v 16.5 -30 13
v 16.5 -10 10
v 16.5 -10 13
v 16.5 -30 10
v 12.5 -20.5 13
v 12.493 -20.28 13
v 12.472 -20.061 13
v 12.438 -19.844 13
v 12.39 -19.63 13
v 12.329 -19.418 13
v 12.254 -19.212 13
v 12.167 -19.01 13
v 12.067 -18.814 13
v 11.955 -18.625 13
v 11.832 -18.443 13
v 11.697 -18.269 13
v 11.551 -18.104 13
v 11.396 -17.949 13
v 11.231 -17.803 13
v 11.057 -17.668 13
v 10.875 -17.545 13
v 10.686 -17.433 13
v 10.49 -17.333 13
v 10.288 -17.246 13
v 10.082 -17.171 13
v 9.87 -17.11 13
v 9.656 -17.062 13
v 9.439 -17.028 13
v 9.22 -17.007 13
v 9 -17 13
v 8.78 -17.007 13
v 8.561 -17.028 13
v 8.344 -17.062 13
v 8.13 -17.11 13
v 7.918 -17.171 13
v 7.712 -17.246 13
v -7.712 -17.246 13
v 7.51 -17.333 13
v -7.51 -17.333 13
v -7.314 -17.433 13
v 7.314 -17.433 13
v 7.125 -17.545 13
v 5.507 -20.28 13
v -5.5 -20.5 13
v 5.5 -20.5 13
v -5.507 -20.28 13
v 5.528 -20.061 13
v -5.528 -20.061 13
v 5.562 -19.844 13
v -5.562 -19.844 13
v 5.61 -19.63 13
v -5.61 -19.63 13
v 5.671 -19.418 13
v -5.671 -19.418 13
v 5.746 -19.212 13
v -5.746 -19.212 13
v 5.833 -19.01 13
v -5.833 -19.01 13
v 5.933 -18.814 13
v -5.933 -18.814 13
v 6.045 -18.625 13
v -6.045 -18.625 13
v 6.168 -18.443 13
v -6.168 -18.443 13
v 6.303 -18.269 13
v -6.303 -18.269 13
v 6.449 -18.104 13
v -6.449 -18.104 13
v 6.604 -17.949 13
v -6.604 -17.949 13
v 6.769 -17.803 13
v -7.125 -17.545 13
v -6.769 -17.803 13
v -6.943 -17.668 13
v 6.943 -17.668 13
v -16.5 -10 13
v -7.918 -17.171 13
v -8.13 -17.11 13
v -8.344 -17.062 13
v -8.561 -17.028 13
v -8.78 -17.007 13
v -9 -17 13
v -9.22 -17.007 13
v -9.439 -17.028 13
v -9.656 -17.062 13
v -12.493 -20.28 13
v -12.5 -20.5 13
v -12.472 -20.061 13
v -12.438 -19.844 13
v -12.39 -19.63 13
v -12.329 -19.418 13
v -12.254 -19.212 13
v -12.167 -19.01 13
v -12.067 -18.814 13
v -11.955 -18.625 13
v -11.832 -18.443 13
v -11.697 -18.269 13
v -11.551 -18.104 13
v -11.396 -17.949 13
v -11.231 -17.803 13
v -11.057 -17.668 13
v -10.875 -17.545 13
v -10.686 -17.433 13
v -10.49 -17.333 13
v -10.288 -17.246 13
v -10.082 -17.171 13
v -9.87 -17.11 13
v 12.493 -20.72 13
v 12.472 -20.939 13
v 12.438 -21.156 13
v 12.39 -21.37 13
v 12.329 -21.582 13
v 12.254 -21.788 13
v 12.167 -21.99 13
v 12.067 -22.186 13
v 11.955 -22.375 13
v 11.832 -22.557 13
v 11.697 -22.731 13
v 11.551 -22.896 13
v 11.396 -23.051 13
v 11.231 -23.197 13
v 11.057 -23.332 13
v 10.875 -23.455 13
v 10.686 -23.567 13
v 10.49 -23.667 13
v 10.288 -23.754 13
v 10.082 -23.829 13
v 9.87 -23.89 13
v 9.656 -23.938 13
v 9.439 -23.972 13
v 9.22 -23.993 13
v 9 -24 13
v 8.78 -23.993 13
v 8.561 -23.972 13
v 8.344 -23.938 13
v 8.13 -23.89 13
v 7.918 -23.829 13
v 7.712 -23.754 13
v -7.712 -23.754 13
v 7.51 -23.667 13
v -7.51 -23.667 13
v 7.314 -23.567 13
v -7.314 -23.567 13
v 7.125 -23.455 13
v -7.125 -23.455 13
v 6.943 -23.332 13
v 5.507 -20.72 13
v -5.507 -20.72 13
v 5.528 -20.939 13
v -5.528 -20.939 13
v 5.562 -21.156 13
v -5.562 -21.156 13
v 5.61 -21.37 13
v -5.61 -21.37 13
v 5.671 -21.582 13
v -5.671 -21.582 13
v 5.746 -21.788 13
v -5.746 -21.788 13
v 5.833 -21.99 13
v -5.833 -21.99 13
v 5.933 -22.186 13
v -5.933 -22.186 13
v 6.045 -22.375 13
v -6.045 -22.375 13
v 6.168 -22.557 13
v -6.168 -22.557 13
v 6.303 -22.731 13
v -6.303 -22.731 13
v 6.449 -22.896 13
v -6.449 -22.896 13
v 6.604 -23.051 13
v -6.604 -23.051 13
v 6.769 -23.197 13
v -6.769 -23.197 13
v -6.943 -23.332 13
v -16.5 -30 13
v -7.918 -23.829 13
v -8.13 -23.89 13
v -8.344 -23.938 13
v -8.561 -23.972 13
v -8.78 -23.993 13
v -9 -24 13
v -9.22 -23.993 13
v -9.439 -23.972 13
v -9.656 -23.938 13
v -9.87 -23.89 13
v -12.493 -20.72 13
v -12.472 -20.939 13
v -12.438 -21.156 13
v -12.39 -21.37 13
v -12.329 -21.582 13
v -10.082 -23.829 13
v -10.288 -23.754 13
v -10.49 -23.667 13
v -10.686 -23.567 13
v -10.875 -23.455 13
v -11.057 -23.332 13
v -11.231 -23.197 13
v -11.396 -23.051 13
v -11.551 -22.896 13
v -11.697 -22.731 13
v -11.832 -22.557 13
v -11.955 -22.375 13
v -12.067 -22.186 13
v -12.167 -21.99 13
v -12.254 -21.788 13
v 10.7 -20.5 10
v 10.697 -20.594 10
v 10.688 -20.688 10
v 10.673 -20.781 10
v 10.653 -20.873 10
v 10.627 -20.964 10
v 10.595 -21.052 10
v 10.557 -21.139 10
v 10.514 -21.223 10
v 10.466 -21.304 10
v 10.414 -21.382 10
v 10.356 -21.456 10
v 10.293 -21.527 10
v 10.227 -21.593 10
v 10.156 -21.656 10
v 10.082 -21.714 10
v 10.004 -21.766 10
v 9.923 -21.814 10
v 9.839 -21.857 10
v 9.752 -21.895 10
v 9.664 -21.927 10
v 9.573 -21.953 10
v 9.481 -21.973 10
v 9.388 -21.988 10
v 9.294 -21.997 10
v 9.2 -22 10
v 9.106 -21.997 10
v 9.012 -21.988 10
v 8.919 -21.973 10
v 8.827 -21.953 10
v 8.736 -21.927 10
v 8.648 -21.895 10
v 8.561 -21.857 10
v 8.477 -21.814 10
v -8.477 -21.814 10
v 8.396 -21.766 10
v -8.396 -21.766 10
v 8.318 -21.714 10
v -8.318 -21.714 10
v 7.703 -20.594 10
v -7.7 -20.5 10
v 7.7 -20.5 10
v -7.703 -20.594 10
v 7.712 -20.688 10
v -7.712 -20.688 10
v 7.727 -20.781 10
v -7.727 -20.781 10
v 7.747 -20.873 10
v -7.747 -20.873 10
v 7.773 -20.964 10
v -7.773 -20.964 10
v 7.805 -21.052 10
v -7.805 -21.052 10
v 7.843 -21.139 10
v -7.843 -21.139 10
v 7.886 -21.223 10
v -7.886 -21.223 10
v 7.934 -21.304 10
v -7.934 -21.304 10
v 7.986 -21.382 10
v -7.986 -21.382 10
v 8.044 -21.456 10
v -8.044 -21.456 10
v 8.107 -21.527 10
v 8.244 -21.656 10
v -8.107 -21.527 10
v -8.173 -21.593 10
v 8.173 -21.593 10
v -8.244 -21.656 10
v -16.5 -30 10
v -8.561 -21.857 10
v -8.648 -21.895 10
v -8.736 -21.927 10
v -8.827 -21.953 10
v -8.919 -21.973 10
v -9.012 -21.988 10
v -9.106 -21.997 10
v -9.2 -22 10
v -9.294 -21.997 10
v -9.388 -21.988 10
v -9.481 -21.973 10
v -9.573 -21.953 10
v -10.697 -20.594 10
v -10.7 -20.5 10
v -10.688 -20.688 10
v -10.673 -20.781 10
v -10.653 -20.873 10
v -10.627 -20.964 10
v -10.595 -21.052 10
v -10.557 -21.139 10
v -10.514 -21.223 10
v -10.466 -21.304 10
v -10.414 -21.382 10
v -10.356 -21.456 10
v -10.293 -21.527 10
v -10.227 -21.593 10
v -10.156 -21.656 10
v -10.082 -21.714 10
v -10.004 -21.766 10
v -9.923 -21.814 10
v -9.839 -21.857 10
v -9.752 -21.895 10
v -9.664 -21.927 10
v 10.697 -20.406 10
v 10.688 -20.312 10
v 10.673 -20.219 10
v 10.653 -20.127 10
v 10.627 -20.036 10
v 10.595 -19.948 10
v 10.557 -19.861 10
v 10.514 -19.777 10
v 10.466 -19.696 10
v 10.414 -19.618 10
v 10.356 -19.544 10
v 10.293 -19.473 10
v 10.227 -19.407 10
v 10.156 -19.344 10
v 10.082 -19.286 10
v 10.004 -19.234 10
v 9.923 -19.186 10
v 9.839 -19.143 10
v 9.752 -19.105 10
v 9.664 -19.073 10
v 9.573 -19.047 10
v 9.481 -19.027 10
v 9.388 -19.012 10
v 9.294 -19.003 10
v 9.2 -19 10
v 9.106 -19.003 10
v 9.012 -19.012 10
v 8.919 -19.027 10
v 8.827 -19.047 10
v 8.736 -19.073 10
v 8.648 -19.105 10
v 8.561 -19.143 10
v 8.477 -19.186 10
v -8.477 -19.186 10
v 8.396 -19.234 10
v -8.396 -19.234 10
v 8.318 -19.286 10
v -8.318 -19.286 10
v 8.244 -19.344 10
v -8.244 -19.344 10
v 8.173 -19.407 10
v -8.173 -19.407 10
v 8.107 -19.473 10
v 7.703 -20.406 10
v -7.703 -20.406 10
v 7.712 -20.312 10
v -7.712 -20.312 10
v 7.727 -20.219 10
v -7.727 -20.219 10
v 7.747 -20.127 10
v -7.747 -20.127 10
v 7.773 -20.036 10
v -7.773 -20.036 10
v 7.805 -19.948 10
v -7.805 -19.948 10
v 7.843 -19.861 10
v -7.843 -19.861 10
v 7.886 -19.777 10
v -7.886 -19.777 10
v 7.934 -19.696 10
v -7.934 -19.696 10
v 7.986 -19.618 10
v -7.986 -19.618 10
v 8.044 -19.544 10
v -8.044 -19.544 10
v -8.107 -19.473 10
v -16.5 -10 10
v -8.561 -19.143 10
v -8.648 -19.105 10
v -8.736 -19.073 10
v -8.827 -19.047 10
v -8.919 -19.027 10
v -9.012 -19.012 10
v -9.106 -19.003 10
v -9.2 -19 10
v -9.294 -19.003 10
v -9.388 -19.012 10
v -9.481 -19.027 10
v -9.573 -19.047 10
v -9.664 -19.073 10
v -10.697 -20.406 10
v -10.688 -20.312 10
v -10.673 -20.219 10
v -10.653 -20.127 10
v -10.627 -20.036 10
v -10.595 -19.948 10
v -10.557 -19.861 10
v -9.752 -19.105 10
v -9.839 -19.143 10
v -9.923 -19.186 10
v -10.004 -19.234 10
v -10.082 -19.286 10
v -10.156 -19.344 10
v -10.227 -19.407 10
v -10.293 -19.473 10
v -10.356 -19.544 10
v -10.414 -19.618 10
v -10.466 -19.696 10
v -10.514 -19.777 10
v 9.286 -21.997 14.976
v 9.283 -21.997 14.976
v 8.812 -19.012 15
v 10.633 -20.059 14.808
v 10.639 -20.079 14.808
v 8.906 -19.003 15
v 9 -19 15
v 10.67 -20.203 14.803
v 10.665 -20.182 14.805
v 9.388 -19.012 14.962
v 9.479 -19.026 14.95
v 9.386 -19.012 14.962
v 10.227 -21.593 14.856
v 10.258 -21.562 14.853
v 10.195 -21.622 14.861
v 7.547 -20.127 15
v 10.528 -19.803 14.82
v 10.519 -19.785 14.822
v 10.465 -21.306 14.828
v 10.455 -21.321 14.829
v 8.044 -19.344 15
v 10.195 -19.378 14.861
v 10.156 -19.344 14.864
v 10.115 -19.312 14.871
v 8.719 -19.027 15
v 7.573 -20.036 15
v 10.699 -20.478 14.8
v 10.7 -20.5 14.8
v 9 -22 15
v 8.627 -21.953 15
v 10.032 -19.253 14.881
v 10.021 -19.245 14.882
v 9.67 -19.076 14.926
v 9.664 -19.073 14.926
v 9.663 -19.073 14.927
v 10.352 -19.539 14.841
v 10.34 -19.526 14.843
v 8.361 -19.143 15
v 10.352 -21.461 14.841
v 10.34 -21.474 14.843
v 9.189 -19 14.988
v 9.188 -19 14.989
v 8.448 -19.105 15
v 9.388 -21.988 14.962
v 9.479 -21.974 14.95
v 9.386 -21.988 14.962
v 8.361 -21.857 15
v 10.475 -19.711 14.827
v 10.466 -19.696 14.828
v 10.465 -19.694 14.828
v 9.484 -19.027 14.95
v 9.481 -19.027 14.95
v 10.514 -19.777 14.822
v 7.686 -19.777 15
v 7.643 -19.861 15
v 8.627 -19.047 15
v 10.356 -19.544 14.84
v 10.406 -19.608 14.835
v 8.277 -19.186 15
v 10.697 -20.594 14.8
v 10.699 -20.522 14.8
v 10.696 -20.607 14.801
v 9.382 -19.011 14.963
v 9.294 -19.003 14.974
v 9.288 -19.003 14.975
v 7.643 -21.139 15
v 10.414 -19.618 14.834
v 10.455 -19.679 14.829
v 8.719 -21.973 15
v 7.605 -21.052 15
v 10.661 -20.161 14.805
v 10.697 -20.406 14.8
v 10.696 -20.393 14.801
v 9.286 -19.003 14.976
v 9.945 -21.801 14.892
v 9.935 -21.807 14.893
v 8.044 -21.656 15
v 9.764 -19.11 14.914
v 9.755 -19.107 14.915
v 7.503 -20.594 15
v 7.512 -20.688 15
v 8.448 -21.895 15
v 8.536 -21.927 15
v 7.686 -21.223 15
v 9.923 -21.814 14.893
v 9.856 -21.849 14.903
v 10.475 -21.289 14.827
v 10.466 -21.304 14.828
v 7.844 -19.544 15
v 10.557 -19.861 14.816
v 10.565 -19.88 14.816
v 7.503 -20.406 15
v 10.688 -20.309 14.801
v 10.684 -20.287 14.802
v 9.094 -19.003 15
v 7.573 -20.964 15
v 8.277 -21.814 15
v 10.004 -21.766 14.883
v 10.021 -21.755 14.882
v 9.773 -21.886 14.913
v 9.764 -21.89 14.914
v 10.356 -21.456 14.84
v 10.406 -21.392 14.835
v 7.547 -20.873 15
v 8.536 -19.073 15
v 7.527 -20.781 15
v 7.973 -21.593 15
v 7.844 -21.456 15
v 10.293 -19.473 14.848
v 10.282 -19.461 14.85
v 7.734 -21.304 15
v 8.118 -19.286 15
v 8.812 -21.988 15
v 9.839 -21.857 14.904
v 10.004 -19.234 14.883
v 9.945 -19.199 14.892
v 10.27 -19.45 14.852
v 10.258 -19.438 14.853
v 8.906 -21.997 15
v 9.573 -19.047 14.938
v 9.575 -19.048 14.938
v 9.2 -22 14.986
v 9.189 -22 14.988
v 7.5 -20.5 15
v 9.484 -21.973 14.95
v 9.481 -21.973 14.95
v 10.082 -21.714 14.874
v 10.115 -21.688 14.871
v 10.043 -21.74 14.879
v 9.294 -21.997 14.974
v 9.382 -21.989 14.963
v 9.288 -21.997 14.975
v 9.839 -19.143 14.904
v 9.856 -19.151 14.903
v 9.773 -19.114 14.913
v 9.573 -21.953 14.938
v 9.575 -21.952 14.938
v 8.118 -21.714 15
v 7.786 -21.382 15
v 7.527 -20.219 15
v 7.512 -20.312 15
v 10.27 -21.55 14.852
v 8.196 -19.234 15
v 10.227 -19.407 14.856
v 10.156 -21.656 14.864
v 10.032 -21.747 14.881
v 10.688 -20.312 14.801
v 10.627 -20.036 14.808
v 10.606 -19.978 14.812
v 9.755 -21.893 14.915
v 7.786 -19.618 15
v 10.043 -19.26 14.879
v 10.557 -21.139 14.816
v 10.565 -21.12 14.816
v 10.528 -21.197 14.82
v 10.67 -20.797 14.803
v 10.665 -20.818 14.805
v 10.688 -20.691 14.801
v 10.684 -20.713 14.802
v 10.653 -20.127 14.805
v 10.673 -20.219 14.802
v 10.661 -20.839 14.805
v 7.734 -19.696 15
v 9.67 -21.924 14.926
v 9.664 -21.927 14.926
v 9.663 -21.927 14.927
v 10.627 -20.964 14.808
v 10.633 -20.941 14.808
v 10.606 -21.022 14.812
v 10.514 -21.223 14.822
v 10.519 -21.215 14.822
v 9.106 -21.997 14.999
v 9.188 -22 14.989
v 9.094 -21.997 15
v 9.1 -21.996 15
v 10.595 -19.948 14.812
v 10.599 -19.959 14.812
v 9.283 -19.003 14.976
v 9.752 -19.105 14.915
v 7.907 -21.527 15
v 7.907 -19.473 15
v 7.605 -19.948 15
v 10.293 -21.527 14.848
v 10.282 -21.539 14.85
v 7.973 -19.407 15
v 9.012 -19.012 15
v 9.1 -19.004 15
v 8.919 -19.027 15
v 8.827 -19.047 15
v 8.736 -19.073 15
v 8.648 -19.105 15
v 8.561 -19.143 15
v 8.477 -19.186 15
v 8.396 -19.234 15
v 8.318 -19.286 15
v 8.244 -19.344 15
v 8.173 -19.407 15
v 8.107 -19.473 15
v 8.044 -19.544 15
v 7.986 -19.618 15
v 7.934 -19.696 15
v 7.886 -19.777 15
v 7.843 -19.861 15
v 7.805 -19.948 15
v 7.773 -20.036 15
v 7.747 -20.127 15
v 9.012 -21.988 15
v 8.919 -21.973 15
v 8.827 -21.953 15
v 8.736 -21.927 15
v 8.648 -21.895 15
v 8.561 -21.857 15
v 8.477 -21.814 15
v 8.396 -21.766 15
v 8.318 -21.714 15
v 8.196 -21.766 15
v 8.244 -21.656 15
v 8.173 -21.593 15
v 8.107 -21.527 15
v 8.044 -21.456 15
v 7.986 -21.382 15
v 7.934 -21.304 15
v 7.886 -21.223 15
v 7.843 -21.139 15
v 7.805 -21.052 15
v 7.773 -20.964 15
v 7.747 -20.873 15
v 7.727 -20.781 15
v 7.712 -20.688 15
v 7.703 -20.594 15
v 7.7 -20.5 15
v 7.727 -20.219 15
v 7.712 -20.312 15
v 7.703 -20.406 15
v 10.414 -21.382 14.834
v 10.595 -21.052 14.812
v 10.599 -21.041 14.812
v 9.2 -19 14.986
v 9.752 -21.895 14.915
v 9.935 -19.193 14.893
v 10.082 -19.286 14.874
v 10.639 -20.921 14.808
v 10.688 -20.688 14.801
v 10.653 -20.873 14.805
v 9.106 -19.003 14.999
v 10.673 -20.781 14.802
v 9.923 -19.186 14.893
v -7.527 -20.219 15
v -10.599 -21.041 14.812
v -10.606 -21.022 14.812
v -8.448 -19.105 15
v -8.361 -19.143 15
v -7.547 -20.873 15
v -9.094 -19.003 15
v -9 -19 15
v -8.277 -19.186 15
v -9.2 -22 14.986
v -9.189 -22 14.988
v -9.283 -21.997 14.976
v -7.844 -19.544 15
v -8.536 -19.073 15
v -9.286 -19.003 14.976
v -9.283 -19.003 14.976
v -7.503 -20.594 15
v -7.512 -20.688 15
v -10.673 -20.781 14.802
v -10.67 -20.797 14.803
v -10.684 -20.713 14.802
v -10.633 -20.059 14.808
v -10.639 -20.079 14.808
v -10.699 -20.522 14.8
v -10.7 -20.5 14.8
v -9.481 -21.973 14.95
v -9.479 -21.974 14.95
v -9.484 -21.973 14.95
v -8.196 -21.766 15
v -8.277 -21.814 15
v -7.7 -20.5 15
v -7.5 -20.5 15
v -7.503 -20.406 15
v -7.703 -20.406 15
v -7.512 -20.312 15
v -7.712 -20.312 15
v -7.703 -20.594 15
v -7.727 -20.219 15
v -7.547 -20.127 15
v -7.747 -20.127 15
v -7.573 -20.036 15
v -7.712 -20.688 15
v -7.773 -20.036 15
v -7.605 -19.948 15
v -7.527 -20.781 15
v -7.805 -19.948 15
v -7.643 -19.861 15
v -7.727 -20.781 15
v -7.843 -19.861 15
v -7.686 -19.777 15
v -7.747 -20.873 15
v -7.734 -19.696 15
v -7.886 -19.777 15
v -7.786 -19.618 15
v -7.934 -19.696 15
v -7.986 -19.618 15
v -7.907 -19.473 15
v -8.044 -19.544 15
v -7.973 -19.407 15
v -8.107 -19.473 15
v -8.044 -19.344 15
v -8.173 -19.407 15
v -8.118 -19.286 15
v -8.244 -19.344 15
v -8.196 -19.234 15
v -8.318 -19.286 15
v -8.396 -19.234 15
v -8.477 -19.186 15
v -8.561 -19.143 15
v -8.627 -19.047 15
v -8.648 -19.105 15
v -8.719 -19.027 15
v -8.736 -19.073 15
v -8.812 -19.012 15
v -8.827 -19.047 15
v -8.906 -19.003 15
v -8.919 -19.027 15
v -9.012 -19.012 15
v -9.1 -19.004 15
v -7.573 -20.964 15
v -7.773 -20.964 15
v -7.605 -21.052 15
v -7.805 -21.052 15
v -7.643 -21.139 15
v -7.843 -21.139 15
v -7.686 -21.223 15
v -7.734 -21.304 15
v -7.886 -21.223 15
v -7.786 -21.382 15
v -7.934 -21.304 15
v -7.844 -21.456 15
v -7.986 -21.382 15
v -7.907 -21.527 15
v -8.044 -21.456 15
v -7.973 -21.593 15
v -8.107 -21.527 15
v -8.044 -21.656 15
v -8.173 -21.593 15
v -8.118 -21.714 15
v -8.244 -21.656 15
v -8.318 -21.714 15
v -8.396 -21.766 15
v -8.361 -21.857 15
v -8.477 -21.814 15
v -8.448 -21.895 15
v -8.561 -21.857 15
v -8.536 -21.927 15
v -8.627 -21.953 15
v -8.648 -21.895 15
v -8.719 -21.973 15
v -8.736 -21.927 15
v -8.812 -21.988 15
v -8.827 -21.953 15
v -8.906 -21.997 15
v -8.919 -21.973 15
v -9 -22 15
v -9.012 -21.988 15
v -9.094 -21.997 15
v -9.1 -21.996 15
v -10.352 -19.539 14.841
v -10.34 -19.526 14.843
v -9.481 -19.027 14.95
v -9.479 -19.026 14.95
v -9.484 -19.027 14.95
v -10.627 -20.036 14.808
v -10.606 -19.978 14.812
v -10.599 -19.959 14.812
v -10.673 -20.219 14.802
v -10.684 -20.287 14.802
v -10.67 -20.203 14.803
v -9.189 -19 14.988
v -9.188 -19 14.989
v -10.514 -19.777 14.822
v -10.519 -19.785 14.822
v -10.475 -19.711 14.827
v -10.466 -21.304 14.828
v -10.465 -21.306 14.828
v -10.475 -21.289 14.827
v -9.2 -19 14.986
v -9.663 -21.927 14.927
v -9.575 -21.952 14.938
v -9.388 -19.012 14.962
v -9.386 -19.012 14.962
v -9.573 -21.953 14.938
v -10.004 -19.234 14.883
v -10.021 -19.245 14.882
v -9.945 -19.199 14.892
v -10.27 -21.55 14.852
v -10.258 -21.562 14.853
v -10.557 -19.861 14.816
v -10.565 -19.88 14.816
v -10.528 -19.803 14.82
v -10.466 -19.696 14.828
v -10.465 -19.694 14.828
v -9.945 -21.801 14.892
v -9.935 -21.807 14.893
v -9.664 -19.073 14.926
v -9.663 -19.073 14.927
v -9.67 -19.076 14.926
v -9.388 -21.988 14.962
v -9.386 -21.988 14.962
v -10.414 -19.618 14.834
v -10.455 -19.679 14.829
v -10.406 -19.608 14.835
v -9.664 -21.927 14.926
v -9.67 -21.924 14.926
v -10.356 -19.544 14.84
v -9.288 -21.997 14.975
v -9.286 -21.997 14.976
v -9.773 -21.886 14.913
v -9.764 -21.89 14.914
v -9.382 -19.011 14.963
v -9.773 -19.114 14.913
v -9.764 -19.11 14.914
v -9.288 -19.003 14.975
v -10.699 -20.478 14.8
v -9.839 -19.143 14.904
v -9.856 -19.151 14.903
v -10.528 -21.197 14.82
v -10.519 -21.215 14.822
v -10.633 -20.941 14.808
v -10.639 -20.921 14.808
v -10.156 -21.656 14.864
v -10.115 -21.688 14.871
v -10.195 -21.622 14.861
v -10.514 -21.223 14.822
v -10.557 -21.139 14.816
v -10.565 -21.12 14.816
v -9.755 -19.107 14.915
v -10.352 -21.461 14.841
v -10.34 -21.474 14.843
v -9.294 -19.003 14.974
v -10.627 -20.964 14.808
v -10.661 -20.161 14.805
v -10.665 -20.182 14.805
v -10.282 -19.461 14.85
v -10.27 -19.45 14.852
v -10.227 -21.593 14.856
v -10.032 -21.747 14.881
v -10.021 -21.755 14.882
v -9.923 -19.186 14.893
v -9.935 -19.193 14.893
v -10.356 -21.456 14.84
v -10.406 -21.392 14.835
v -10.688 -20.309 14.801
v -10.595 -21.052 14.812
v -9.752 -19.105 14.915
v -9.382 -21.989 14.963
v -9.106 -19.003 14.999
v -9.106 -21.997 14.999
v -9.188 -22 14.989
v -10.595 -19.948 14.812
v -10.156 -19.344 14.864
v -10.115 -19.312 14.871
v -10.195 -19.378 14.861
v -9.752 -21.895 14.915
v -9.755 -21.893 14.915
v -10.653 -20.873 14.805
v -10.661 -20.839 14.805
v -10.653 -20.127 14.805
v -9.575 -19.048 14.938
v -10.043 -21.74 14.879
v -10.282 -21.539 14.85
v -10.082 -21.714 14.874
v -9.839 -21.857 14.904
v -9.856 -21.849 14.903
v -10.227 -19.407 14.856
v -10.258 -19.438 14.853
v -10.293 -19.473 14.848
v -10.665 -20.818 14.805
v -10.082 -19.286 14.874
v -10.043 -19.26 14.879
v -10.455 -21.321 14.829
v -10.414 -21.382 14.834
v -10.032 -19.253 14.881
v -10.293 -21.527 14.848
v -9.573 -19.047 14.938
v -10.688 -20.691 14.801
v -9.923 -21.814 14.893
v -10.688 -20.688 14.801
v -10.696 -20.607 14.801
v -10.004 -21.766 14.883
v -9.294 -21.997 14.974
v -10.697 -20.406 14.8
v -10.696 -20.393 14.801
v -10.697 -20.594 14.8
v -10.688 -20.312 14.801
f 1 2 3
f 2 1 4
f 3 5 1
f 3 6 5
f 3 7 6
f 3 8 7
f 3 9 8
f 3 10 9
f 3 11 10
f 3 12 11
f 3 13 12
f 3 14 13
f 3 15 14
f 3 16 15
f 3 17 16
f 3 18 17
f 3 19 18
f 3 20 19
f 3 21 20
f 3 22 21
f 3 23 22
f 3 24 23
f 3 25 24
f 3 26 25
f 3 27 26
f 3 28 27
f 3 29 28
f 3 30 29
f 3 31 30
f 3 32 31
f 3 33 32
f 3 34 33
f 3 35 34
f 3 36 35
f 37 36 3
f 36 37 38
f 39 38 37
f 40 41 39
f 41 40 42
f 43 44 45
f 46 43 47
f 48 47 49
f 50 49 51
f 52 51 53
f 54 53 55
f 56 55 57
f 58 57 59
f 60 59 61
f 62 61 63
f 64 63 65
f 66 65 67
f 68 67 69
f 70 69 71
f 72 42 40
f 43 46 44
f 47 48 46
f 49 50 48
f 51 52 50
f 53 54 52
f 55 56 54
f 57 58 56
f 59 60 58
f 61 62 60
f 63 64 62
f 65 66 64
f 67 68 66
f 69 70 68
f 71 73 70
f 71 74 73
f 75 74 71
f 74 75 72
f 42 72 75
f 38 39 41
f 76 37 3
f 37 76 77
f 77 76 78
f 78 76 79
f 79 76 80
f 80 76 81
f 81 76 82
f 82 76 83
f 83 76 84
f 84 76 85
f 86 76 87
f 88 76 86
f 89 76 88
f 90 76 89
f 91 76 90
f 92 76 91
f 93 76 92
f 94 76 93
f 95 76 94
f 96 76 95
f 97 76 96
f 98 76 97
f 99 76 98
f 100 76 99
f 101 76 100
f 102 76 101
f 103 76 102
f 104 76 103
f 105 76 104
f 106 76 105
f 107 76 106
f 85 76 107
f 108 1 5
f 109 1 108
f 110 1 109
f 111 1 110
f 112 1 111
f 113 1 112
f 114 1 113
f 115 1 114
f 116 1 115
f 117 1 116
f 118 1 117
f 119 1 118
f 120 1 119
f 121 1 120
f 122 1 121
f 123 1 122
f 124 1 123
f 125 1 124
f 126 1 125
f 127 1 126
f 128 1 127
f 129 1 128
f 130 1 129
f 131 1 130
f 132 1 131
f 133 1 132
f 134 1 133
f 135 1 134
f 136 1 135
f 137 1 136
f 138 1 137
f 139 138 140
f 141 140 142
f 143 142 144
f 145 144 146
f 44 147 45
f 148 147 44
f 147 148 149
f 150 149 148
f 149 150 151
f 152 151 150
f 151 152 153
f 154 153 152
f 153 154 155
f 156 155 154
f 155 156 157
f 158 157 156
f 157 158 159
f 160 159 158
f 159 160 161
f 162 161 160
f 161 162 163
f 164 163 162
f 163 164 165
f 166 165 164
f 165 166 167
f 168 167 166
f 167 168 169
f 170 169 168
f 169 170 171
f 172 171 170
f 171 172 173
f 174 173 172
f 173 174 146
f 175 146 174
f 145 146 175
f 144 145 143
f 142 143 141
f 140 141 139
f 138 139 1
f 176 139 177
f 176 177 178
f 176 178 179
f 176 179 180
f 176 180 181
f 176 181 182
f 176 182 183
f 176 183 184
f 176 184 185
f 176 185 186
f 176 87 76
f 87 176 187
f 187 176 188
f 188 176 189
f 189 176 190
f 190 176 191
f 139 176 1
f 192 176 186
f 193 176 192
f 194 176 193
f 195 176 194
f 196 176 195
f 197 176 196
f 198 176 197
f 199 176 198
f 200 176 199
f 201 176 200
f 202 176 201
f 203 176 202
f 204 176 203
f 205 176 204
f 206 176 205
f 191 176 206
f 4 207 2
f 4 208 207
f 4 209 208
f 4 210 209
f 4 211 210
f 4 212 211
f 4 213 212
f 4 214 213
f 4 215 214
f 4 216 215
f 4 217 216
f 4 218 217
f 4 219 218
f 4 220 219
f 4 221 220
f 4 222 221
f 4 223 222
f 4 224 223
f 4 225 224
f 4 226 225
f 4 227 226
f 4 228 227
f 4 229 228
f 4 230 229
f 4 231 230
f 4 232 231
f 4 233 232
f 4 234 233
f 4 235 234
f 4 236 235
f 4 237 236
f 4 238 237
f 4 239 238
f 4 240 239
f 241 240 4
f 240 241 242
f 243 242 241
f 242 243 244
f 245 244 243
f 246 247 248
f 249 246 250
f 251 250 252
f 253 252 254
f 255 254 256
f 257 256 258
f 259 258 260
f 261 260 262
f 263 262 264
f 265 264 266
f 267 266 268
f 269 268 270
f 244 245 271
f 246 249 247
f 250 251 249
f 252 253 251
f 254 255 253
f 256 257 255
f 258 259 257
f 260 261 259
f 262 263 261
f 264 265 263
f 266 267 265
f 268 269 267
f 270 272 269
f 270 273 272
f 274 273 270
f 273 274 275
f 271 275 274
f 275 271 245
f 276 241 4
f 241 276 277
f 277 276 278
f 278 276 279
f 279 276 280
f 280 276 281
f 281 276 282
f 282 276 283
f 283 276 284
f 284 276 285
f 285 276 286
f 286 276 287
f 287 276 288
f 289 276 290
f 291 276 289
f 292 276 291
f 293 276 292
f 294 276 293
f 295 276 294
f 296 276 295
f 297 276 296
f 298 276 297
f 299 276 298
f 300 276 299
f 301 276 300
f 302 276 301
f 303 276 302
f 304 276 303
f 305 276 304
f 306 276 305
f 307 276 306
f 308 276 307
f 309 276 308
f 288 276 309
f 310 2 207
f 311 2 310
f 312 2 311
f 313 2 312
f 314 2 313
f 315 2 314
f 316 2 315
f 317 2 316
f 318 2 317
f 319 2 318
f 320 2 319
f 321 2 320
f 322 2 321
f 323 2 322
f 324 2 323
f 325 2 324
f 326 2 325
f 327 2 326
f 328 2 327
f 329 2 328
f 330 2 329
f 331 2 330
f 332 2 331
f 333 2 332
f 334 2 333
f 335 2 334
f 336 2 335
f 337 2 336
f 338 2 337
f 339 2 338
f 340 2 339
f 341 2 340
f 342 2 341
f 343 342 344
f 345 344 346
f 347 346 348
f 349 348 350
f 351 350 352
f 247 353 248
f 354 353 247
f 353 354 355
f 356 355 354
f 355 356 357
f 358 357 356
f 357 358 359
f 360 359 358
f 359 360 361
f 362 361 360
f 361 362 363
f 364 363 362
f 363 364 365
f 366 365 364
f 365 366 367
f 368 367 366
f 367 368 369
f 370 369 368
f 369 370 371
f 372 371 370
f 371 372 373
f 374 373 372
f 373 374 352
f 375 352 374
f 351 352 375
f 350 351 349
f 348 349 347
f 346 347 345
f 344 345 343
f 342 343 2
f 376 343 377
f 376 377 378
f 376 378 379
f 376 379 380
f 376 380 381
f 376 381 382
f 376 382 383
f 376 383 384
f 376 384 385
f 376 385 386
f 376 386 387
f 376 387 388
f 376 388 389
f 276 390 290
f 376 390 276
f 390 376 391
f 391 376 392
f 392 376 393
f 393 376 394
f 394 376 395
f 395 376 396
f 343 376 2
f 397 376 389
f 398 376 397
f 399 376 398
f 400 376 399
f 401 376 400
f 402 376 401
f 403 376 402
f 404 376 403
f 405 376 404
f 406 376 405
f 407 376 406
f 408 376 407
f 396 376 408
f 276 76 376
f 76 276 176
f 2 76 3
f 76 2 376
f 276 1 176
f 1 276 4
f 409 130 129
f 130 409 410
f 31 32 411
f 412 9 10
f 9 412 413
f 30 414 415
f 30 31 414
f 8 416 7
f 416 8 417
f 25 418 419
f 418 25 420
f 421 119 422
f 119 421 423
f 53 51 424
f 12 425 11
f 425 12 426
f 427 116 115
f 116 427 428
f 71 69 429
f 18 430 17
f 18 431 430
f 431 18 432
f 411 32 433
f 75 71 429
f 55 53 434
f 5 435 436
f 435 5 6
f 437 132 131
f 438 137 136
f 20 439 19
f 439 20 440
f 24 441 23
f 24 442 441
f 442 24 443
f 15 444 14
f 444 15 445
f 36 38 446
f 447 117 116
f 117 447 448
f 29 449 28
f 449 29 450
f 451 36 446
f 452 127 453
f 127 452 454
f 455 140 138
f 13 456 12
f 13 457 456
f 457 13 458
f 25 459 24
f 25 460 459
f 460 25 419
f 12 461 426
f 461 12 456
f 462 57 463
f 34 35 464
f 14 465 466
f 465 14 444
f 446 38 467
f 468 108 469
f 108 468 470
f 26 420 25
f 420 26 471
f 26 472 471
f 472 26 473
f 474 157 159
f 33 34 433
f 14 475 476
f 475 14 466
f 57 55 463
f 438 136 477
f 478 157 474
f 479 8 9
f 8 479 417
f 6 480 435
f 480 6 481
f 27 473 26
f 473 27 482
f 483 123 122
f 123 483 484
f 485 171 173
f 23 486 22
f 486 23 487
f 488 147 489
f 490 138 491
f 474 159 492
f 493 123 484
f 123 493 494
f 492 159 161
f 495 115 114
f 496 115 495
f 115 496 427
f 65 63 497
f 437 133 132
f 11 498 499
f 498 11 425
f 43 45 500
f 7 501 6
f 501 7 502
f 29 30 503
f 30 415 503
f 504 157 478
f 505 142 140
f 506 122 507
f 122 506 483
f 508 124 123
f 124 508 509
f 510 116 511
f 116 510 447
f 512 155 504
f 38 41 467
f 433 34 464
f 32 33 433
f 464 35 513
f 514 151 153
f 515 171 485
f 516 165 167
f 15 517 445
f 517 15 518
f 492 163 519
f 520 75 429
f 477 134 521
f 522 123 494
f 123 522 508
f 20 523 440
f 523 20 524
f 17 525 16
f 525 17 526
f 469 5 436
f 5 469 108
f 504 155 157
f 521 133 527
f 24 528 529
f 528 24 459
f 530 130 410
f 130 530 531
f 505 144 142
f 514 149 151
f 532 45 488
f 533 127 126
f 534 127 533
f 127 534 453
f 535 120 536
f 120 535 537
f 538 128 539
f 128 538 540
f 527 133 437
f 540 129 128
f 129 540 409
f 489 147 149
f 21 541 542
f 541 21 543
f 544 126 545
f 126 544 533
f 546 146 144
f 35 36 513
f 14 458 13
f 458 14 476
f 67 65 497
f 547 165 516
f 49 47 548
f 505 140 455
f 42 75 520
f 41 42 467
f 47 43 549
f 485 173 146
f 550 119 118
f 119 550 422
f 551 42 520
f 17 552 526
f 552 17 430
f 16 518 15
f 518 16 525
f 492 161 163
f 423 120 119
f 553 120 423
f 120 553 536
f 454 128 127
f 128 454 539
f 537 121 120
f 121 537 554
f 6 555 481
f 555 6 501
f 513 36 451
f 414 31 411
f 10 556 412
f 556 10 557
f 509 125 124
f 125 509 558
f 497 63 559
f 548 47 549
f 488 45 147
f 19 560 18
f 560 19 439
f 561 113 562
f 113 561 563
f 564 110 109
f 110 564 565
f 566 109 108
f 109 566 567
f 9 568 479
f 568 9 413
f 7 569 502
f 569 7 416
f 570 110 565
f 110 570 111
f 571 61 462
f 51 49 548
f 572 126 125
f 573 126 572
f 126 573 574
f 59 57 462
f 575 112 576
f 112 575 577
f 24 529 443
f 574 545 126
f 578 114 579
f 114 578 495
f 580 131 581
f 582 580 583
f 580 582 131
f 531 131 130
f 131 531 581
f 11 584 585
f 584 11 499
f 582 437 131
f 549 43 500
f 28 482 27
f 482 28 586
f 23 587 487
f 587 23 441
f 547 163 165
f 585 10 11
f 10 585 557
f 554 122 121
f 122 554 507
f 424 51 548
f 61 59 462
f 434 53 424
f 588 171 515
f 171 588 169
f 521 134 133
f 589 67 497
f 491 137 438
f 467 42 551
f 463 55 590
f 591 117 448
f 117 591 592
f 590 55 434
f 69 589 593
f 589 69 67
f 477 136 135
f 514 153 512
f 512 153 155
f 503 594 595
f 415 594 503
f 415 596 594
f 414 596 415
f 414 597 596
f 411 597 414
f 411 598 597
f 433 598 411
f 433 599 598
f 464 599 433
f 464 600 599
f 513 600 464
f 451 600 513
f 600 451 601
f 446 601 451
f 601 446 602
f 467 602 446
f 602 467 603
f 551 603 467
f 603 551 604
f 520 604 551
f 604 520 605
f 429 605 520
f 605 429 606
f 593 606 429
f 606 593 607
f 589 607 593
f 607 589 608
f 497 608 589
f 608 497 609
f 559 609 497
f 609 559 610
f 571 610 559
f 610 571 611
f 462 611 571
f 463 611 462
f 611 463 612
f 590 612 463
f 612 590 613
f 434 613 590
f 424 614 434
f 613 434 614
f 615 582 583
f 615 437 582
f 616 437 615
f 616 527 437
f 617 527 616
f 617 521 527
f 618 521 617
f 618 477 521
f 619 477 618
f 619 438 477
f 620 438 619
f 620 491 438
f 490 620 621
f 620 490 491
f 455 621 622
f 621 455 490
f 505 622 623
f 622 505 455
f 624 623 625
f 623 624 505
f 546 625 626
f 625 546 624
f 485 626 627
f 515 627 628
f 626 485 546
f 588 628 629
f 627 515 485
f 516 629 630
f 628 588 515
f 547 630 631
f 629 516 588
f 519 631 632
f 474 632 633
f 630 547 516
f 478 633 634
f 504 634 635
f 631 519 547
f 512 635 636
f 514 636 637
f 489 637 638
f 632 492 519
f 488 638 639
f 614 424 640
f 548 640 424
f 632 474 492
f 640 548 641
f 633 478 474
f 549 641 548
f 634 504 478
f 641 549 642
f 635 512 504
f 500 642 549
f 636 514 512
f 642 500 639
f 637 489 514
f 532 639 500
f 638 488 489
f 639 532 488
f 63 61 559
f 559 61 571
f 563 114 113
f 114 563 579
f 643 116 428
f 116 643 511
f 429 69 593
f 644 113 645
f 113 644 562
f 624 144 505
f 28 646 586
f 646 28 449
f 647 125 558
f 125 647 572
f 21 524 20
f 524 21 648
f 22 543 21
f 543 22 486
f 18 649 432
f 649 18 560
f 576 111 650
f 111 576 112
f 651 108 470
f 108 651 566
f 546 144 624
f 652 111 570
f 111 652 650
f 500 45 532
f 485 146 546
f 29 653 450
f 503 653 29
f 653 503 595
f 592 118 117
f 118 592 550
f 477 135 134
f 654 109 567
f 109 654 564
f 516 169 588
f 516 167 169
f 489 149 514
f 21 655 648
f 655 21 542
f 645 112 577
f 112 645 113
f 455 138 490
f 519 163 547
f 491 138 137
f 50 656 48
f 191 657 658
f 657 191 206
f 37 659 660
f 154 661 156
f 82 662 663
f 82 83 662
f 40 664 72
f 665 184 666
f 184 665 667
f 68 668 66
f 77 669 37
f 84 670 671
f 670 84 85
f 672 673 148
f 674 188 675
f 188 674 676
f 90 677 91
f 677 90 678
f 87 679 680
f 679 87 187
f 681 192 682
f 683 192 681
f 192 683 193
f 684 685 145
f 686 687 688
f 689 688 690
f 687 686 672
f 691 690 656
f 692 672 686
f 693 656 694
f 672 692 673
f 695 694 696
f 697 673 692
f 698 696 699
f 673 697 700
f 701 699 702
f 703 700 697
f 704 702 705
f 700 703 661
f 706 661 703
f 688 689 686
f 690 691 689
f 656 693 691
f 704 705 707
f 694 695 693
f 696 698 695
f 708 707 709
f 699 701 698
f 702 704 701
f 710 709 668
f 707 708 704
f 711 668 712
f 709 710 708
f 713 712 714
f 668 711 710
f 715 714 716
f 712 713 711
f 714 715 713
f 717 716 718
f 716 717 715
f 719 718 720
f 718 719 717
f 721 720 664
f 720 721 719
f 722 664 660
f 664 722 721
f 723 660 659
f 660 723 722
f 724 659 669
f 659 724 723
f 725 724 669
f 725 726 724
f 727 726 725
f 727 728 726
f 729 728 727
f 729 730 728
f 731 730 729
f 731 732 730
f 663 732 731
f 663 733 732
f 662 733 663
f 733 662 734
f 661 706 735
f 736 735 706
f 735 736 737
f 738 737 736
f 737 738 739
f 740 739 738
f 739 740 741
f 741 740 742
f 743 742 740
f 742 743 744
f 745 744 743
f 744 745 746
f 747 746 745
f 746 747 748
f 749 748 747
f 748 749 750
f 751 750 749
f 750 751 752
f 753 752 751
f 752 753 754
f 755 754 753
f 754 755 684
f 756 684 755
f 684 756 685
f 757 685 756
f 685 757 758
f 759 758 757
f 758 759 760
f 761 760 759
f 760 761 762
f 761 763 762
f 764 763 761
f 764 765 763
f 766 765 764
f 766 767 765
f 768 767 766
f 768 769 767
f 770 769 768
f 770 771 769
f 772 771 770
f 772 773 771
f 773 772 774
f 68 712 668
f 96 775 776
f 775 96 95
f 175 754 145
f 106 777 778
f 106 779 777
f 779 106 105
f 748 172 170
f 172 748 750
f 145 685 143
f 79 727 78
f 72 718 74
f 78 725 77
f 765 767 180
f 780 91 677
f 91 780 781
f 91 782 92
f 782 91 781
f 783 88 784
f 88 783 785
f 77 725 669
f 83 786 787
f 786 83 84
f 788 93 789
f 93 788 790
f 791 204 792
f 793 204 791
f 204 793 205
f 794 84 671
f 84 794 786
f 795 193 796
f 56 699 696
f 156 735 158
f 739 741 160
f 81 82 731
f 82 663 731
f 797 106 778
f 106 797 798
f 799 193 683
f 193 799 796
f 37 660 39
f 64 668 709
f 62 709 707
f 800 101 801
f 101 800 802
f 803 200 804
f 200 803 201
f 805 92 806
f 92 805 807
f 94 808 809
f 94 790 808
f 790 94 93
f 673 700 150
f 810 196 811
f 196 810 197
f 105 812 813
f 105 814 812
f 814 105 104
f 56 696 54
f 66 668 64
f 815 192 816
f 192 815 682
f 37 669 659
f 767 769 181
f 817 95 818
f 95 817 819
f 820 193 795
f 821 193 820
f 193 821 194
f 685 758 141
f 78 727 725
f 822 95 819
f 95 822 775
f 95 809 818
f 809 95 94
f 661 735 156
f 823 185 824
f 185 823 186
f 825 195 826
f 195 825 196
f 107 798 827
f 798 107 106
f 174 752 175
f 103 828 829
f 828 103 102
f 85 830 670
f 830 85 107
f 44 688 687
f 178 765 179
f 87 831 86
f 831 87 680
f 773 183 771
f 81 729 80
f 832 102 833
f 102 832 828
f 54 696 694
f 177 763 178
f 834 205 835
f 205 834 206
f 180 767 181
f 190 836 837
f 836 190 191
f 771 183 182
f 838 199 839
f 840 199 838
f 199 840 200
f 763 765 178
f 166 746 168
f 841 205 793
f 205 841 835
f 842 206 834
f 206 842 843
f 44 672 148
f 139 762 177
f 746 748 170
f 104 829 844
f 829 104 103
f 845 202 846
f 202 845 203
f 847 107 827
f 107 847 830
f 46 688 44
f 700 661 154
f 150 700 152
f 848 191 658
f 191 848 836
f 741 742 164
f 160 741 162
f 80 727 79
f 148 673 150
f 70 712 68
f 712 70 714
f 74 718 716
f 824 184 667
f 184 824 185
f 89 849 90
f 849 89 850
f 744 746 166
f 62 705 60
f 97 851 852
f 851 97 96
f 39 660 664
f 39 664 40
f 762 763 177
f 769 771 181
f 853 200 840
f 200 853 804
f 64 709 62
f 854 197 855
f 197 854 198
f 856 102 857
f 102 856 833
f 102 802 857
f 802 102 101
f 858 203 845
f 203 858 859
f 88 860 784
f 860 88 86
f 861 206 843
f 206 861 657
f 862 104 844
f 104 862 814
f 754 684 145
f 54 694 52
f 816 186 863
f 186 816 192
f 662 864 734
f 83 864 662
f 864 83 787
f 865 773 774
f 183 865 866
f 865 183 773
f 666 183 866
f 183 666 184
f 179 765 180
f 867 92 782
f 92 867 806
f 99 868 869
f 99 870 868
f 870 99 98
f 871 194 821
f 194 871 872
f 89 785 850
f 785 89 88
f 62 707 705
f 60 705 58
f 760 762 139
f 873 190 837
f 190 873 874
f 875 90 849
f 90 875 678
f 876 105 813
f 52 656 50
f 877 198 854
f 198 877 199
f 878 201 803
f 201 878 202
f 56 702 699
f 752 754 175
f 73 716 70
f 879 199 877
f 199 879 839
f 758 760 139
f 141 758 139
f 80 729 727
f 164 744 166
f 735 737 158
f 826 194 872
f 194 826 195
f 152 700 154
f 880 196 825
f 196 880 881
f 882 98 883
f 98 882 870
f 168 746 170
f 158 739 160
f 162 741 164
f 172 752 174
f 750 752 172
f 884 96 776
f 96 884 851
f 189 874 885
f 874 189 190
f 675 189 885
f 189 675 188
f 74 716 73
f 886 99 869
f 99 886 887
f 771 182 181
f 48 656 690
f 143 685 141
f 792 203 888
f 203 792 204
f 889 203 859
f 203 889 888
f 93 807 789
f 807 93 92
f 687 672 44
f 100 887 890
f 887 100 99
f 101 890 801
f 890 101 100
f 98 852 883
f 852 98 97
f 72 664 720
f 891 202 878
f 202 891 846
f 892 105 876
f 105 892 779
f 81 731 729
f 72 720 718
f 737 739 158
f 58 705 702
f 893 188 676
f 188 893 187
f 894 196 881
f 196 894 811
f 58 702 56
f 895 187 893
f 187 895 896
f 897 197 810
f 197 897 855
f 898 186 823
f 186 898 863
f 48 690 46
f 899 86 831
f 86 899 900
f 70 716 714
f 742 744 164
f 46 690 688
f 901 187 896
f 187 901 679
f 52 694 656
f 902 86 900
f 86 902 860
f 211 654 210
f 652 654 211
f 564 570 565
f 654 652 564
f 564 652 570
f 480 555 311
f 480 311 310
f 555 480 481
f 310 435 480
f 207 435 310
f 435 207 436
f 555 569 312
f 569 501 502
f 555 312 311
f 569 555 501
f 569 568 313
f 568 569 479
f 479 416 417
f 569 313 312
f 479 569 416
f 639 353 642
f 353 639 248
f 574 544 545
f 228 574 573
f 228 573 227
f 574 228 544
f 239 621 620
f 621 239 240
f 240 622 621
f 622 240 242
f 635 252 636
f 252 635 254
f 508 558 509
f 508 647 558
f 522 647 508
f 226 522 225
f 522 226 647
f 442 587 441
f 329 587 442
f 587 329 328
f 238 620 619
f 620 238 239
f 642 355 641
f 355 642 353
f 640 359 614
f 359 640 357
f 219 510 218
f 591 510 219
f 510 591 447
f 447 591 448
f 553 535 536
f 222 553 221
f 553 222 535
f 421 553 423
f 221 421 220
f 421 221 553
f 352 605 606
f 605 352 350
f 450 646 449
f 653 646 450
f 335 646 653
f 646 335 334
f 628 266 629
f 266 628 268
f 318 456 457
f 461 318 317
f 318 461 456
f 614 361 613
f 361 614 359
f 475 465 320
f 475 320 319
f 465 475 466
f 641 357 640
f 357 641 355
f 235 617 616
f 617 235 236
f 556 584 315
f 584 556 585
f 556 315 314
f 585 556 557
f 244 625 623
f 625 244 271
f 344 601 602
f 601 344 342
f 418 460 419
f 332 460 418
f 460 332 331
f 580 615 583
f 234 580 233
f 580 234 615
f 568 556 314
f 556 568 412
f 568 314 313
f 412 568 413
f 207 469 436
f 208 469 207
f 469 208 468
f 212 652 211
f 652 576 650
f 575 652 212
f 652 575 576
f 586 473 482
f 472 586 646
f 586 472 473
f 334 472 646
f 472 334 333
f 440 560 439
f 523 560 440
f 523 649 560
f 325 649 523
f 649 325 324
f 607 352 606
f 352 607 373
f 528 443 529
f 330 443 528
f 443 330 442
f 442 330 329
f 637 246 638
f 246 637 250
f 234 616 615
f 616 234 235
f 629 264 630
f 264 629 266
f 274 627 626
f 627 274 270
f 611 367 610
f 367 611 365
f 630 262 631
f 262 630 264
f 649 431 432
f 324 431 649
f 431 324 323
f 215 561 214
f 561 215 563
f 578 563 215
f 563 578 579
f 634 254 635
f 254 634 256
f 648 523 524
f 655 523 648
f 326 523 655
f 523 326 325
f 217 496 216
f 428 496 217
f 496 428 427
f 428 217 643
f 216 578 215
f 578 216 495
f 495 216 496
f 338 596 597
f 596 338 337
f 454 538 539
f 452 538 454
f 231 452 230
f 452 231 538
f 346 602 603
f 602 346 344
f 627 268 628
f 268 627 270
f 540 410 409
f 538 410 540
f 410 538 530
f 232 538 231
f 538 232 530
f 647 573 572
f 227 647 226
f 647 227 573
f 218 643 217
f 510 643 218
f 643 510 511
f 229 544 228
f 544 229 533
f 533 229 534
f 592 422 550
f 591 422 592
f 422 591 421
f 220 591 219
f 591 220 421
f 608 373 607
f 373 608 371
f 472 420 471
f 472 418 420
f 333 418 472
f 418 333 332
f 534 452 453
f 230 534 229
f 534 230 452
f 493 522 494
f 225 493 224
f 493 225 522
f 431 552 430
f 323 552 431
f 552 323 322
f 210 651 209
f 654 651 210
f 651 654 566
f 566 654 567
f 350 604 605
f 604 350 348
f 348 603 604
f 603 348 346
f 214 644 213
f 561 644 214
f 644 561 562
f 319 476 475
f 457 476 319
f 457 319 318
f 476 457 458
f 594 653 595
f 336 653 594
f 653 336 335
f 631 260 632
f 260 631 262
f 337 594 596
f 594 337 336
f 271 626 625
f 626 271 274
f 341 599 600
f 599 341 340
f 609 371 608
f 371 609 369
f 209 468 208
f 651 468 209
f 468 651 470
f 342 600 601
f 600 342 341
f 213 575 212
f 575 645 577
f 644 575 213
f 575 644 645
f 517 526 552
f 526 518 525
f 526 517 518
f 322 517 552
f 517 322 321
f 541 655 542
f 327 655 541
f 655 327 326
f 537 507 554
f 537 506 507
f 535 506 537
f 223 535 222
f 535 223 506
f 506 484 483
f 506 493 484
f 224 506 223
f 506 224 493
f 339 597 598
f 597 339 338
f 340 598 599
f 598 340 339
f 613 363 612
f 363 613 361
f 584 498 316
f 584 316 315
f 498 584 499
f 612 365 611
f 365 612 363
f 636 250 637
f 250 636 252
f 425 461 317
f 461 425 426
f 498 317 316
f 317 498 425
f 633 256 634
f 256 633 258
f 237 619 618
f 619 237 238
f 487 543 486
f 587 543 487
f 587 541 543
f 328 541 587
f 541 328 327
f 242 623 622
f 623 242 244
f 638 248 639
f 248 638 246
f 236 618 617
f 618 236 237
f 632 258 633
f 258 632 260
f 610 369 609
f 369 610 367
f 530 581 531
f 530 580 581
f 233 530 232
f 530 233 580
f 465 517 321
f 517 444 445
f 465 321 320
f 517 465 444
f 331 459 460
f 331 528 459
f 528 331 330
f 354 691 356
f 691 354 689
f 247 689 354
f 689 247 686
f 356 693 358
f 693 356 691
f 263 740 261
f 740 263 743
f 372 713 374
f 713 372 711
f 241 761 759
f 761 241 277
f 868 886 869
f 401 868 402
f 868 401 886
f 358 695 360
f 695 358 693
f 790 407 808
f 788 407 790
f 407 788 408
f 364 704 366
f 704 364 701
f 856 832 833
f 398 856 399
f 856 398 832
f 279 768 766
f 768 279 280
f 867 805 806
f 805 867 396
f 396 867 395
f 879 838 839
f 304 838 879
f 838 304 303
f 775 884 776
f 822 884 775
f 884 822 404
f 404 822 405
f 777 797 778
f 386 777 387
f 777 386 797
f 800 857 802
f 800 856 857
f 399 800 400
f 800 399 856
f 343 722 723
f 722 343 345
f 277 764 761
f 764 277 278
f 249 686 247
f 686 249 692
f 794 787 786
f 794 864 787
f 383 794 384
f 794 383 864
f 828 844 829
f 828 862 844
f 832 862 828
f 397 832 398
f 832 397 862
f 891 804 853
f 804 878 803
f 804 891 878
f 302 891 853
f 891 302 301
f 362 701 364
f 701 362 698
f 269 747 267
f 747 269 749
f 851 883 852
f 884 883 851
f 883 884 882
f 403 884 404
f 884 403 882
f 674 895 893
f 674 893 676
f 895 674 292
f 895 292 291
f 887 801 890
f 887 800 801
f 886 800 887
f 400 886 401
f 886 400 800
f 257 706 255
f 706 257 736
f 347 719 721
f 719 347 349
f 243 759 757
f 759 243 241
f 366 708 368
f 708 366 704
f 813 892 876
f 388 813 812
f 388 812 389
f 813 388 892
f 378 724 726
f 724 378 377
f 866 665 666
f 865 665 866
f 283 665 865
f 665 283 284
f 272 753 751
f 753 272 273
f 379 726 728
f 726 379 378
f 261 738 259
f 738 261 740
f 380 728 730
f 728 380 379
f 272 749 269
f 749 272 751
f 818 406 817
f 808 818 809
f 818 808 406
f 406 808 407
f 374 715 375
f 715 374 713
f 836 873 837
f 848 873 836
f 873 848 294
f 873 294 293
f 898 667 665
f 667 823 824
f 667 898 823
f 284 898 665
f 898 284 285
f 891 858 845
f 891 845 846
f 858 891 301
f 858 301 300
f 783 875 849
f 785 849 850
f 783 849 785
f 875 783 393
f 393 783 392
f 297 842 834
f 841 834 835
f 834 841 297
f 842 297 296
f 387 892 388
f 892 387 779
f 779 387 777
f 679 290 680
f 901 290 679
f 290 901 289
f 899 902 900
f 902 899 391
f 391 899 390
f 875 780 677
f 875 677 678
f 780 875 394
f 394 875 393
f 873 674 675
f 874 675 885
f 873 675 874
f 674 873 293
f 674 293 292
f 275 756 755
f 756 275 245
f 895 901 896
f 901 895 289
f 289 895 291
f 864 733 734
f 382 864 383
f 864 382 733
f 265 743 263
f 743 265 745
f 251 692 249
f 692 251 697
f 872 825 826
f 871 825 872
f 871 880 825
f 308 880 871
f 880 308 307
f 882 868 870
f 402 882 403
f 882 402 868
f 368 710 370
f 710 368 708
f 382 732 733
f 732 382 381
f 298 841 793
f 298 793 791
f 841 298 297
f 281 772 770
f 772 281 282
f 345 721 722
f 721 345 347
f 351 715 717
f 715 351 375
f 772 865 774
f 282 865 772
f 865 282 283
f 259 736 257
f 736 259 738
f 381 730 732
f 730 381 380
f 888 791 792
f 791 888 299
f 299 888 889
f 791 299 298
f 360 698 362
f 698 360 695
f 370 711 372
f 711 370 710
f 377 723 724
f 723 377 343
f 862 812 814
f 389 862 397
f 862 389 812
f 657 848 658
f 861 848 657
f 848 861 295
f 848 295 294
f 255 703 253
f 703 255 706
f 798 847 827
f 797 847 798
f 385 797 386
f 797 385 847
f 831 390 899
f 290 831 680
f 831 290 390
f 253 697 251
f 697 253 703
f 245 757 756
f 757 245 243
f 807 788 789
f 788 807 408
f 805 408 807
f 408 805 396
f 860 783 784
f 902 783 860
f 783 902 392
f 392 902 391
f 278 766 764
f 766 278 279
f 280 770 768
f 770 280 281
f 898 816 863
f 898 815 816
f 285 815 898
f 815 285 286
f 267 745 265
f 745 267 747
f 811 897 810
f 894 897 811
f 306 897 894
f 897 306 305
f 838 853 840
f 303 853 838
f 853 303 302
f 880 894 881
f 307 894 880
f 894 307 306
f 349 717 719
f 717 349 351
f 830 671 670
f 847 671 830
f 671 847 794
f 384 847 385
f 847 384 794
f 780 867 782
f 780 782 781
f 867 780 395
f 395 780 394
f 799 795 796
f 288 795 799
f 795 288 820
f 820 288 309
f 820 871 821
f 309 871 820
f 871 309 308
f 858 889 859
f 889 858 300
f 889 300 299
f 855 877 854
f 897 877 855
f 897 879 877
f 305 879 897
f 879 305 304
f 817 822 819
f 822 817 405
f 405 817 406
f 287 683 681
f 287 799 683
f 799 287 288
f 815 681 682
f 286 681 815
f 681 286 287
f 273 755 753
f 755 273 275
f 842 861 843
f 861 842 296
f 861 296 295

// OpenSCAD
difference(){
	union(){          

        translate([-16.5,-30,10]){
              cube([33,20,3], center=false);
        }

        translate([9,-30+2.5+7,13]){
            rotate([0,0,90]){
                cylinder(h=2, r1=3.5, r2=1.5, $fn=100, center=false);
            }
        }           
        translate([-9,-30+2.5+7,13]){
            rotate([0,0,90]){
                cylinder(h=2, r1=3.5, r2=1.5, $fn=100, center=false);
            }
        }           
   

	}
	union() {


        translate([9.2,-30+2.5+7,-2]){
            rotate([0,0,0]){
                cylinder(h=200, r=1.5, $fn=100, center=false);
            }
        }           
        translate([-9.2,-30+2.5+7,-2]){
            rotate([0,0,0]){
                cylinder(h=200, r=1.5, $fn=100, center=false);
            }
        }           


        
        
	}
}
